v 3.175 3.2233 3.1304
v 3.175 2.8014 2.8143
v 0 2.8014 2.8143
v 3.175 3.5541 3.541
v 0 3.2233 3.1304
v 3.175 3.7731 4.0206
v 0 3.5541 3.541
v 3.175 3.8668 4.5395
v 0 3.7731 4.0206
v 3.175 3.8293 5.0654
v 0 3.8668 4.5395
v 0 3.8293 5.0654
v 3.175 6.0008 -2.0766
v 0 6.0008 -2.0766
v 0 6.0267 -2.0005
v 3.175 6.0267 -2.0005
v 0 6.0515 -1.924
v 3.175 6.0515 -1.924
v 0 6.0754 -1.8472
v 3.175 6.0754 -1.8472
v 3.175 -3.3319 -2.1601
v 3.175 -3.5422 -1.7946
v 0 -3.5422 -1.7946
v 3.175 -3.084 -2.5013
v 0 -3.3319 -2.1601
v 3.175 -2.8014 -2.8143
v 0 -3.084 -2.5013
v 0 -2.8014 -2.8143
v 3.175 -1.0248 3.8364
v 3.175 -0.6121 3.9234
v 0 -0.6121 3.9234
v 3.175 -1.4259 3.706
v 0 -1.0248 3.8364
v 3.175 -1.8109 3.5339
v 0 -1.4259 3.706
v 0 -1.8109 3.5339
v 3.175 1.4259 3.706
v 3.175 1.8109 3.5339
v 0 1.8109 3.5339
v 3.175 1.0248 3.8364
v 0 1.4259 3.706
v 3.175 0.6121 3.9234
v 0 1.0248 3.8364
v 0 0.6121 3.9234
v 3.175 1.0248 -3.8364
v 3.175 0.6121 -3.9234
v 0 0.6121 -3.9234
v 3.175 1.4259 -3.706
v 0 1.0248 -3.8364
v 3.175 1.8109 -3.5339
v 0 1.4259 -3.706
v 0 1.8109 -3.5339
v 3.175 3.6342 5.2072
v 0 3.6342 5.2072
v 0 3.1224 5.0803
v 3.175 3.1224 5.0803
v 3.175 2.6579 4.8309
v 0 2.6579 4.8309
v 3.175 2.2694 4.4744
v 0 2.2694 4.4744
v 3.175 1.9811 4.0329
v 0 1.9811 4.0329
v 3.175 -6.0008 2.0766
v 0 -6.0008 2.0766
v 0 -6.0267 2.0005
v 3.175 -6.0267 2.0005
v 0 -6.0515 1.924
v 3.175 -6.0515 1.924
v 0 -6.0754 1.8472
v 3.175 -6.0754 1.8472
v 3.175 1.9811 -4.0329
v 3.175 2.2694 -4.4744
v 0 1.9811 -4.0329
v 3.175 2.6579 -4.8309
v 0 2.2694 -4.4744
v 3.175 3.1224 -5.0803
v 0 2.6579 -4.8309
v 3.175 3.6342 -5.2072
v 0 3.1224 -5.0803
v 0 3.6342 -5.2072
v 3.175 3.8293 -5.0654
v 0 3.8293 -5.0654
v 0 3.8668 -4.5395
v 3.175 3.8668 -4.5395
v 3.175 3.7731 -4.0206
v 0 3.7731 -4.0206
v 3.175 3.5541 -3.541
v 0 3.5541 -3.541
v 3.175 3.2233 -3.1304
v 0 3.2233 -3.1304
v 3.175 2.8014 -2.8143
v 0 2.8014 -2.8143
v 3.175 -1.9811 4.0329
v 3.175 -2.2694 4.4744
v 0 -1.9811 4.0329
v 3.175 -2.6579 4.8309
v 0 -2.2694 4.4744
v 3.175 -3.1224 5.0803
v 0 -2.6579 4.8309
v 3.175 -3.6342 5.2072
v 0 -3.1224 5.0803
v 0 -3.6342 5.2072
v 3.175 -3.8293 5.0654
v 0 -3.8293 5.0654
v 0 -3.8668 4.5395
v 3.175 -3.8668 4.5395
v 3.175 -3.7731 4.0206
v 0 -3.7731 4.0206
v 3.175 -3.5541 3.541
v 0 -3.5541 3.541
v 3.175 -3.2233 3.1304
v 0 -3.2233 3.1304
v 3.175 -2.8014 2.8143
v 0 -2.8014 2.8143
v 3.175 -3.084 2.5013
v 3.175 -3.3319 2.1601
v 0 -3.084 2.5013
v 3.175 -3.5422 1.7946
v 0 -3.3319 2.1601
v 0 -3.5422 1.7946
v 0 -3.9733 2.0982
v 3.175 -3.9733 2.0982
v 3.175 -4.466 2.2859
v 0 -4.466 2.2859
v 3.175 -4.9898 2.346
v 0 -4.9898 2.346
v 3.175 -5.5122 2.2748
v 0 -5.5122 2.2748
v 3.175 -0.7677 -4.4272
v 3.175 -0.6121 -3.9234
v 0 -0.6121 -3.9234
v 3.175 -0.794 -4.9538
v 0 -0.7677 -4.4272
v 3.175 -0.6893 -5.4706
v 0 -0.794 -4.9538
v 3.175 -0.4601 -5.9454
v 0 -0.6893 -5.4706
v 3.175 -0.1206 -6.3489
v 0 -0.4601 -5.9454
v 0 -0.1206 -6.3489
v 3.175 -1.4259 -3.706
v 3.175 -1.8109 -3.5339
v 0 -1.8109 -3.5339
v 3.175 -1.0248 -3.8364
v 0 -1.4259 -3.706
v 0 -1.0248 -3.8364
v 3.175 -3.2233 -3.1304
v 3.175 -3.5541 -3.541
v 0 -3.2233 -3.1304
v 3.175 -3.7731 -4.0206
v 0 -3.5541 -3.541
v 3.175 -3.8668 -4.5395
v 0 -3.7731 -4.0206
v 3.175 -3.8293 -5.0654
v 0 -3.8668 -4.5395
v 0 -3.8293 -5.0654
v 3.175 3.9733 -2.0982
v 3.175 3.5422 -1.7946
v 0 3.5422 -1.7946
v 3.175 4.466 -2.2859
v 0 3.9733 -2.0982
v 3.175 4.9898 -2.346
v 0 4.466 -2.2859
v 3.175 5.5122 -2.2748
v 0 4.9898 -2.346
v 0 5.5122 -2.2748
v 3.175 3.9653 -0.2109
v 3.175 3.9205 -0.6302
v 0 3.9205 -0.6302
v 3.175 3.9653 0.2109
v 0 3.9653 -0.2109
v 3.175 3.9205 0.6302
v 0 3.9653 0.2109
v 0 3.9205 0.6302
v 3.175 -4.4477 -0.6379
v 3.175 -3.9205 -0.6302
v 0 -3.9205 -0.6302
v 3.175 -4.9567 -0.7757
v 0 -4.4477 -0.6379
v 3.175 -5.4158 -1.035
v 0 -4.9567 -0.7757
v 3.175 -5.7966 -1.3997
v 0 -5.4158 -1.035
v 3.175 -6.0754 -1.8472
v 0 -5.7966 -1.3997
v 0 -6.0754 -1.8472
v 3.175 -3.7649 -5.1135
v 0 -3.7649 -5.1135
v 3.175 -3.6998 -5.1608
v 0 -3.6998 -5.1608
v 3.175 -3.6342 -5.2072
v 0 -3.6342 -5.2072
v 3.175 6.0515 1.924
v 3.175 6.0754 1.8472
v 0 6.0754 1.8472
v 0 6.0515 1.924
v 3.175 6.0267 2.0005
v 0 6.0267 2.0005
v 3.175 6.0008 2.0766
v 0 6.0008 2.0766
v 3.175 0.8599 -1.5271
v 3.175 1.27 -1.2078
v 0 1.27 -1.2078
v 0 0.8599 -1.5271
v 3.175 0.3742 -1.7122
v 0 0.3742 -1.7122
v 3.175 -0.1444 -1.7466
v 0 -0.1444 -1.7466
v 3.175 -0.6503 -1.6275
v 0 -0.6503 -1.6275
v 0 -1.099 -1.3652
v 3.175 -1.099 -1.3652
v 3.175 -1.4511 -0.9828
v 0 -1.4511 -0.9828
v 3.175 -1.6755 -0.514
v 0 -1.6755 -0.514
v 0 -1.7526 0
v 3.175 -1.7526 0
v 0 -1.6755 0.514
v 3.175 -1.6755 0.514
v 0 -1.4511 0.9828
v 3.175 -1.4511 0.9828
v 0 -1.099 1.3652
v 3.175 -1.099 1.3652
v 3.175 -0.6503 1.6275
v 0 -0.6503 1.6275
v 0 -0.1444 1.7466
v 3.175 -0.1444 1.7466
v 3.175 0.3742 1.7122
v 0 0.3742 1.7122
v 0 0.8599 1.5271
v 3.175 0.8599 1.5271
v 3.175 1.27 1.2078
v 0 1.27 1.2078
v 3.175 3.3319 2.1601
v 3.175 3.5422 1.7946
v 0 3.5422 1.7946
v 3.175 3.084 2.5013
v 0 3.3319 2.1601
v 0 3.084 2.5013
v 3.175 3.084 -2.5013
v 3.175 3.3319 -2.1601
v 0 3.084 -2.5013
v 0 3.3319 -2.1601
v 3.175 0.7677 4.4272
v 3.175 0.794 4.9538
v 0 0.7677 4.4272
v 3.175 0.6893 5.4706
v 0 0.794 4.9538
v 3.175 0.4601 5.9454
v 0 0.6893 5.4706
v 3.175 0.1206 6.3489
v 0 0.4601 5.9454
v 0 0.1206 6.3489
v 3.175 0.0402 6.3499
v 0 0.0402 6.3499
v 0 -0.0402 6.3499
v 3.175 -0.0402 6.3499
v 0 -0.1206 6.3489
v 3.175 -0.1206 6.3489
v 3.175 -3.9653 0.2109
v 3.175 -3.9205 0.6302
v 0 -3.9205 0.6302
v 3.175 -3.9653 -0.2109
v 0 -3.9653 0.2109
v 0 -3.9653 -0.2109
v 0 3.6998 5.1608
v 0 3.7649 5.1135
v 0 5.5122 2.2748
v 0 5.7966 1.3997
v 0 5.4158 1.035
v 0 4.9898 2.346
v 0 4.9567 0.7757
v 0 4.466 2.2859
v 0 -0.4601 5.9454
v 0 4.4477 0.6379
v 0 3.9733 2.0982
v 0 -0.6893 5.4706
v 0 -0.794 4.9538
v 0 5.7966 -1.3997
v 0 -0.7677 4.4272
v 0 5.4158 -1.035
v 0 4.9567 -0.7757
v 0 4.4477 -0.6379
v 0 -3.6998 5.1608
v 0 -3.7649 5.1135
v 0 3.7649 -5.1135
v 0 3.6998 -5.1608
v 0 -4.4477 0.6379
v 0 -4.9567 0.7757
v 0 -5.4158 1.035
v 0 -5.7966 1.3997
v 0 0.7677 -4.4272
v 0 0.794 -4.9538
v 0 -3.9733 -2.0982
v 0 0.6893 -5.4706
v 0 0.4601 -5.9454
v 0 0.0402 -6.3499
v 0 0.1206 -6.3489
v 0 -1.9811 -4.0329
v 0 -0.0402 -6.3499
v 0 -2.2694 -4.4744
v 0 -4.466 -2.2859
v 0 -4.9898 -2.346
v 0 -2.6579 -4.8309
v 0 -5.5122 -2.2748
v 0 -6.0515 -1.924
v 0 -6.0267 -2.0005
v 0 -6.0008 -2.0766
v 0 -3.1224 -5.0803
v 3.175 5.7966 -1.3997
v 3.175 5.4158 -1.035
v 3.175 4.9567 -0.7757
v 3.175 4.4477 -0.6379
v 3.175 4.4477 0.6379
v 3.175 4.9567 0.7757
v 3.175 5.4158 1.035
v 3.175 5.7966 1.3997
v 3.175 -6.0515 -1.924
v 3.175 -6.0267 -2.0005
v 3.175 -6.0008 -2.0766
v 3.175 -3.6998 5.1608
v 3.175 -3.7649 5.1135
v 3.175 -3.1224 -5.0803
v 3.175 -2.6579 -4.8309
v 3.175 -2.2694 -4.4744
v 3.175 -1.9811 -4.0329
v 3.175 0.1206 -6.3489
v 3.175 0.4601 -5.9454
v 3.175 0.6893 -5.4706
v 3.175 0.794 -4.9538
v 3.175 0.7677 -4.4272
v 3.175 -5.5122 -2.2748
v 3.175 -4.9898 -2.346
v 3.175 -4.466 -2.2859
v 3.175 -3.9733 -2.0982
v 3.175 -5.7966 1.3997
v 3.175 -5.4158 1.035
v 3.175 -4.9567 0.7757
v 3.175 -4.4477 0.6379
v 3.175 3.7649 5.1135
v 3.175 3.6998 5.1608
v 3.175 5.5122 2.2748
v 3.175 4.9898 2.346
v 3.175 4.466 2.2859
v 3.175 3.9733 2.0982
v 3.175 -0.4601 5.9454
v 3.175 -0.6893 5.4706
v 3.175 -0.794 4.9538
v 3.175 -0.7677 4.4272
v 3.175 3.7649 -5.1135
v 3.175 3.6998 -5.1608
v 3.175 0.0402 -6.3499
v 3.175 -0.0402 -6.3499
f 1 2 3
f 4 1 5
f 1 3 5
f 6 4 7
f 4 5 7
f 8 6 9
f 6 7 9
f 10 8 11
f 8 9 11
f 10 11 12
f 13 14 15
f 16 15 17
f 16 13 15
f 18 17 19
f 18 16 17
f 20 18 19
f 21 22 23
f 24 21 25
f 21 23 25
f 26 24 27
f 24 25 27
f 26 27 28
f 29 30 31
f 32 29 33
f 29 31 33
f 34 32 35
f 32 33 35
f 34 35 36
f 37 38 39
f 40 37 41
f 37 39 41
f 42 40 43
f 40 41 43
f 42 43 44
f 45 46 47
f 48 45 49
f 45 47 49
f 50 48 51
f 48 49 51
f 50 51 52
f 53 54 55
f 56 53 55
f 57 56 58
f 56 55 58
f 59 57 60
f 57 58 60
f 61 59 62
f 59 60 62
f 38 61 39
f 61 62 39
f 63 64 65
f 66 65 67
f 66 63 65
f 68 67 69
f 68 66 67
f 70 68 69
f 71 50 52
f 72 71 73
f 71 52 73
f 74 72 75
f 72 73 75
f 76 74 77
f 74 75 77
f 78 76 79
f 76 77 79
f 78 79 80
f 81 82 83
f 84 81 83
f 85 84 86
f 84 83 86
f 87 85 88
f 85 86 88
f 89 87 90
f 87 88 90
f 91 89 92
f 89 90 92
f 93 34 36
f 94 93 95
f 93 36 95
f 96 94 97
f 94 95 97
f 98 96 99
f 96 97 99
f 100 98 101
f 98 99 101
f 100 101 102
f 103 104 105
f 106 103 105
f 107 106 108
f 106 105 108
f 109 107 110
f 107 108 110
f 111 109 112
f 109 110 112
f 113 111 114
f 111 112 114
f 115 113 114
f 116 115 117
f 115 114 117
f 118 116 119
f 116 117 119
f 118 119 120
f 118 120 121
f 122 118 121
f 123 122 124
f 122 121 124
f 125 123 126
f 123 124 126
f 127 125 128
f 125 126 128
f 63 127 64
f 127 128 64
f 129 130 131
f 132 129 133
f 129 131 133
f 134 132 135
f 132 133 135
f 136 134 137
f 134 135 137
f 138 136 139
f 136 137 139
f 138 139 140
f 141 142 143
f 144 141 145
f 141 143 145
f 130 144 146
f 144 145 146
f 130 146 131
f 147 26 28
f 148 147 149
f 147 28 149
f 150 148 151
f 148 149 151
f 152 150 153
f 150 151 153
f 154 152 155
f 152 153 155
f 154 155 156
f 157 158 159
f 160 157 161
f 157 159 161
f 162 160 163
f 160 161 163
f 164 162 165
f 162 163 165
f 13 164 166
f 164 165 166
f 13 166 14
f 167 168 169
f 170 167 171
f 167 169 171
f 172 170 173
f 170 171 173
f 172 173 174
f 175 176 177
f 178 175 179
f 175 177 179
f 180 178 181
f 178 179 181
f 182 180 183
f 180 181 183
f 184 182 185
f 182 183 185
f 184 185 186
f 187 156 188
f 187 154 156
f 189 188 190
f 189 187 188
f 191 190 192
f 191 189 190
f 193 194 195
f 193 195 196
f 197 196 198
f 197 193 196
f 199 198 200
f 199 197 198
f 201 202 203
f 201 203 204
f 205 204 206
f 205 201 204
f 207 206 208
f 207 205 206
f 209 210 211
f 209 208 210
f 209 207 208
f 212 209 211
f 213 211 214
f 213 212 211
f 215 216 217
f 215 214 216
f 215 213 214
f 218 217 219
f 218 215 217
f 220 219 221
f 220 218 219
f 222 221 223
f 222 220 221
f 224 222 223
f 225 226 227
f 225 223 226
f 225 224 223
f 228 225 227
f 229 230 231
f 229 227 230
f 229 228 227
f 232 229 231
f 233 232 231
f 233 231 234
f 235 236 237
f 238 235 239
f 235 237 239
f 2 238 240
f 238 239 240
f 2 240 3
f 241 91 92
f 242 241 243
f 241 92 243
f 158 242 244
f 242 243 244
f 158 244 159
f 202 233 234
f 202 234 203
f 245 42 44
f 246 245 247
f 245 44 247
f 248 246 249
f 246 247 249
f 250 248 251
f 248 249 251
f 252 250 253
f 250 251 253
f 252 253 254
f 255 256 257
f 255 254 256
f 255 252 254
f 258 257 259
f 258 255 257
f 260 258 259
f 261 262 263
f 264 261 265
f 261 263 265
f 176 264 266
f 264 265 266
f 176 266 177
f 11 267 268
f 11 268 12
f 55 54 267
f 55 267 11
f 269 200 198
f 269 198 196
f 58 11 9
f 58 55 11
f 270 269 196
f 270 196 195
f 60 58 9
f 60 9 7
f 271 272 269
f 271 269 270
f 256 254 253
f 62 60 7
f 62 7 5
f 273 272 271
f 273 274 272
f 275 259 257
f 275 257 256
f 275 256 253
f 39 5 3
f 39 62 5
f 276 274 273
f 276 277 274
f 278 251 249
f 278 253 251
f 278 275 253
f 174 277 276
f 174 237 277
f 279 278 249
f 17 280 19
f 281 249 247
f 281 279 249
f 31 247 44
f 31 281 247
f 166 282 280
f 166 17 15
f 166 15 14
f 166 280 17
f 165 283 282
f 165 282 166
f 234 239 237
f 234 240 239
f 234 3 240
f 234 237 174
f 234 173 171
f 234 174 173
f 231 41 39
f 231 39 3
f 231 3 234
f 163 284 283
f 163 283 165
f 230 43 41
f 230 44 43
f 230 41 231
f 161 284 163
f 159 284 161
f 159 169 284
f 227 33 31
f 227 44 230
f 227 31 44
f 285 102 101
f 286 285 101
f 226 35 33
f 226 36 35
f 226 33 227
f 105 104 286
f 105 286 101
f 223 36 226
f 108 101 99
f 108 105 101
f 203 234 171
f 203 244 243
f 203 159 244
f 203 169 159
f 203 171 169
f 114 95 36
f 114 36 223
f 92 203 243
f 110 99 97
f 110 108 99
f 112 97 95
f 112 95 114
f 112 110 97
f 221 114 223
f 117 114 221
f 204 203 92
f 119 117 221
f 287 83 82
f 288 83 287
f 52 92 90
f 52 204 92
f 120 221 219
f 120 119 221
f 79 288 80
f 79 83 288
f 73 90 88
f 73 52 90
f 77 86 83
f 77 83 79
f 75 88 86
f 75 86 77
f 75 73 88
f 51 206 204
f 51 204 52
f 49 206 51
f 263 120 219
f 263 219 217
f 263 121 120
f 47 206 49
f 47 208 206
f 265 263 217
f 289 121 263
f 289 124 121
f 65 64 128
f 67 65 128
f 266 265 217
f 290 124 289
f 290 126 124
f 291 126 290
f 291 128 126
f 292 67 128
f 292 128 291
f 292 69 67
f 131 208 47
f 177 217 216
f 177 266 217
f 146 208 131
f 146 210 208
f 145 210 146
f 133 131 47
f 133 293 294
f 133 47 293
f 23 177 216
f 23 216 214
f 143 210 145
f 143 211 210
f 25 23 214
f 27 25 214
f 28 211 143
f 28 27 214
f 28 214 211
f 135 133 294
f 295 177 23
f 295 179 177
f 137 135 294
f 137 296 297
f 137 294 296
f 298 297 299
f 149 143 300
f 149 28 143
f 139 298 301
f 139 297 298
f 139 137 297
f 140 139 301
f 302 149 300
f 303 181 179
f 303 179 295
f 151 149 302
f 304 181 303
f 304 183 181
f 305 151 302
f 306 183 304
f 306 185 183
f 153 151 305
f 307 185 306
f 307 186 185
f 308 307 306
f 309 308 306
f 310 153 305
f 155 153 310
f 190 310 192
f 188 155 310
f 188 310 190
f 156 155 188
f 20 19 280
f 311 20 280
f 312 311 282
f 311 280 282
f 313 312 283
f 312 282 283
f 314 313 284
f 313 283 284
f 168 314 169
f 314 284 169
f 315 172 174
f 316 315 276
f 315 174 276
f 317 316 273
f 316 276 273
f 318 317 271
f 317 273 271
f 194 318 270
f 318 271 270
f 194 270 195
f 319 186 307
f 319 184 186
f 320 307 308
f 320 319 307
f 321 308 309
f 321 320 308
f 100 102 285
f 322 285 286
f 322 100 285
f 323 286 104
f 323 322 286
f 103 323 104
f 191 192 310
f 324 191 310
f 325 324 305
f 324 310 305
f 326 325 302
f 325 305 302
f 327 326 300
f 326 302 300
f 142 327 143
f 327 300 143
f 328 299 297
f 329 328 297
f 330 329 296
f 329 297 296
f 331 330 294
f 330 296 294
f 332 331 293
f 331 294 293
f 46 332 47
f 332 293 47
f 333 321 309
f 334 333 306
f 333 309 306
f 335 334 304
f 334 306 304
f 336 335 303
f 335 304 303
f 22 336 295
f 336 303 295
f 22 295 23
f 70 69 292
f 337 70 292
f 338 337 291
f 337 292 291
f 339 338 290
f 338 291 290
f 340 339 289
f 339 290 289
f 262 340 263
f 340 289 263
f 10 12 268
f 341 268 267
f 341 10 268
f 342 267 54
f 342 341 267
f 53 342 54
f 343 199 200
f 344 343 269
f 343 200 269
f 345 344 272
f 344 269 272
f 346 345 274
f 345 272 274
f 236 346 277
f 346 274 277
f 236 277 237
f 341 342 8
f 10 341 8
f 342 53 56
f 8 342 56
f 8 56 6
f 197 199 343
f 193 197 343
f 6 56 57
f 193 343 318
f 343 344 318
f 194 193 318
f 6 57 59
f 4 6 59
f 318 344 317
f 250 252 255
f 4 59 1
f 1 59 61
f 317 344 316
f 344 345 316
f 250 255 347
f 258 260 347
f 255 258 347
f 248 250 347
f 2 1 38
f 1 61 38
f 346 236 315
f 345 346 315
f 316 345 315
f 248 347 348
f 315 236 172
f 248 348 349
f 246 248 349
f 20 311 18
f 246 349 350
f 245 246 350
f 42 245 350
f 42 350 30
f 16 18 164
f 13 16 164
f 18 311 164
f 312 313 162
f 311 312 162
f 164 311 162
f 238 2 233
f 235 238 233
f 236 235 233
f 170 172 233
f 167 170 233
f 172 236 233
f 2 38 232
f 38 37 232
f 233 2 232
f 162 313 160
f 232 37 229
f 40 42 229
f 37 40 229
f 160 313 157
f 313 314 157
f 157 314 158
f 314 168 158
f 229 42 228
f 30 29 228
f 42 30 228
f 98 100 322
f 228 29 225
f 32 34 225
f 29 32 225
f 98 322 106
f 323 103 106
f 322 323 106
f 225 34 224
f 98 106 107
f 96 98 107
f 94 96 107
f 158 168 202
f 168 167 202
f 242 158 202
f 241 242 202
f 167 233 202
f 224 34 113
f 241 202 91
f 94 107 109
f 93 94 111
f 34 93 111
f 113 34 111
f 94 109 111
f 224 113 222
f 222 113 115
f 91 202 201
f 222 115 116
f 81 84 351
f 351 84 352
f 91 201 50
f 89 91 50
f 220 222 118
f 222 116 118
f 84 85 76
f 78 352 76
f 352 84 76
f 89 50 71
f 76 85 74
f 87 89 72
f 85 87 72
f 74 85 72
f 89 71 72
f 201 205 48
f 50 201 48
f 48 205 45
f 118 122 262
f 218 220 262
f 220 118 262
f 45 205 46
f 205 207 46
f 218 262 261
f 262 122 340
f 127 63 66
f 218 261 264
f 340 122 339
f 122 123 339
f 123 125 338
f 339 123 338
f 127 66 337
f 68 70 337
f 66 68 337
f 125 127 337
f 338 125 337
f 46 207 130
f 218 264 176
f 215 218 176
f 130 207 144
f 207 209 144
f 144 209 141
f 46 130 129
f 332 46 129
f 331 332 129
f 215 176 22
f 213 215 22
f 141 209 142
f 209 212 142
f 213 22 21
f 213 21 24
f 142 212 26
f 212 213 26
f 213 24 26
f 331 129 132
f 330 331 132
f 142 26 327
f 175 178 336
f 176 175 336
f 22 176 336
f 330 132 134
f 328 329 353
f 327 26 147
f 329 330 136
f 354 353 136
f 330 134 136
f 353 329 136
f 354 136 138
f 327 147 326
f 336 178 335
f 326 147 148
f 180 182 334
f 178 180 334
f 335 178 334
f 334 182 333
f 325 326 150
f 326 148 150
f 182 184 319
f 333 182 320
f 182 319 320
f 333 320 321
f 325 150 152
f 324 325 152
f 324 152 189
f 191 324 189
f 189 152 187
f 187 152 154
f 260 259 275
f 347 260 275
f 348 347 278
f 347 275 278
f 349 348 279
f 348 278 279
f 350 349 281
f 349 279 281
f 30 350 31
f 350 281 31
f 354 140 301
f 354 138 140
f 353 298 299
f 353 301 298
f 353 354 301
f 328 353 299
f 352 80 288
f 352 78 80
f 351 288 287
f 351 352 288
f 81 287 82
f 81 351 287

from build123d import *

# Parameters (mm, degrees)
BASPROSKE_W        = 3.175
BASPROSKE_H        = 6.35
TOOTHCUT_DEPTH     = 10.525
TEETHCUTS_COUNT    = 10
TEETHCUTS_ANGLE    = 324
BORSKE_R           = 0.99949
BORE_DEPTH         = 50.8000508
CUT_EXTRUDE1_DEPTH = 10.344170464


with BuildPart() as part:
    # BasProSke → Base-Revolve (revolve)
    with BuildSketch(Plane(origin=(0, 0, 0), x_dir=(1, 0, 0), z_dir=(0, 1, 0)), mode=Mode.PRIVATE) as base_revolve_sk:
        with Locations((1.5875, 3.175)):
            Rectangle(BASPROSKE_W, BASPROSKE_H)
    revolve(base_revolve_sk.sketch.rotate(Axis((-10, 0, 0), (1, 0, 0)), 180), axis=Axis((-10, 0, 0), (1, 0, 0)))

    # TooCutSke → ToothCut (cut, through all)
    with BuildSketch(Plane(origin=(0, 0, 0), x_dir=(0, 0, -1), z_dir=(1, 0, 0))):
        with BuildLine():
            ThreePointArc((0.630210727, 3.920537785), (0, 3.970866667), (-0.630210727, 3.920537785))
            ThreePointArc((-0.630210727, 3.920537785), (-0.900510691, 5.2110639), (-1.88228345, 6.091201374))
            ThreePointArc((-1.88228345, 6.091201374), (0, 6.3754), (1.88228345, 6.091201374))
            ThreePointArc((1.88228345, 6.091201374), (0.900510691, 5.2110639), (0.630210727, 3.920537785))
        make_face()
    toothcut = extrude(amount=TOOTHCUT_DEPTH, mode=Mode.SUBTRACT)

    # TeethCuts: ToothCut ×10 about axis
    teethcuts_axis = Axis((-10, 0, 0), (1, 0, 0))
    for i in range(1, TEETHCUTS_COUNT):
        add(toothcut.rotate(teethcuts_axis, i * TEETHCUTS_ANGLE / (TEETHCUTS_COUNT - 1)), mode=Mode.SUBTRACT)

    # BorSke → Bore (cut, symmetric)
    with BuildSketch(Plane(origin=(0, 0, 0), x_dir=(0, 0, -1), z_dir=(1, 0, 0))):
        with Locations(Location((0, 0, 0), (0, 0, 180))):
            Circle(BORSKE_R)
    extrude(amount=BORE_DEPTH, both=True, mode=Mode.SUBTRACT)

    # Sketch1 → Cut-Extrude1 (cut, through all)
    with BuildSketch(Plane(origin=(3.175, 0, 0), x_dir=(0, 0, -1), z_dir=(1, 0, 0))):
        with BuildLine():
            Line((-1.207769332, 1.27), (1.207769332, 1.27))
            ThreePointArc((1.207769332, 1.27), (0, -1.7526), (-1.207769332, 1.27))
        make_face()
    extrude(amount=-CUT_EXTRUDE1_DEPTH, mode=Mode.SUBTRACT)


solid = part.part
